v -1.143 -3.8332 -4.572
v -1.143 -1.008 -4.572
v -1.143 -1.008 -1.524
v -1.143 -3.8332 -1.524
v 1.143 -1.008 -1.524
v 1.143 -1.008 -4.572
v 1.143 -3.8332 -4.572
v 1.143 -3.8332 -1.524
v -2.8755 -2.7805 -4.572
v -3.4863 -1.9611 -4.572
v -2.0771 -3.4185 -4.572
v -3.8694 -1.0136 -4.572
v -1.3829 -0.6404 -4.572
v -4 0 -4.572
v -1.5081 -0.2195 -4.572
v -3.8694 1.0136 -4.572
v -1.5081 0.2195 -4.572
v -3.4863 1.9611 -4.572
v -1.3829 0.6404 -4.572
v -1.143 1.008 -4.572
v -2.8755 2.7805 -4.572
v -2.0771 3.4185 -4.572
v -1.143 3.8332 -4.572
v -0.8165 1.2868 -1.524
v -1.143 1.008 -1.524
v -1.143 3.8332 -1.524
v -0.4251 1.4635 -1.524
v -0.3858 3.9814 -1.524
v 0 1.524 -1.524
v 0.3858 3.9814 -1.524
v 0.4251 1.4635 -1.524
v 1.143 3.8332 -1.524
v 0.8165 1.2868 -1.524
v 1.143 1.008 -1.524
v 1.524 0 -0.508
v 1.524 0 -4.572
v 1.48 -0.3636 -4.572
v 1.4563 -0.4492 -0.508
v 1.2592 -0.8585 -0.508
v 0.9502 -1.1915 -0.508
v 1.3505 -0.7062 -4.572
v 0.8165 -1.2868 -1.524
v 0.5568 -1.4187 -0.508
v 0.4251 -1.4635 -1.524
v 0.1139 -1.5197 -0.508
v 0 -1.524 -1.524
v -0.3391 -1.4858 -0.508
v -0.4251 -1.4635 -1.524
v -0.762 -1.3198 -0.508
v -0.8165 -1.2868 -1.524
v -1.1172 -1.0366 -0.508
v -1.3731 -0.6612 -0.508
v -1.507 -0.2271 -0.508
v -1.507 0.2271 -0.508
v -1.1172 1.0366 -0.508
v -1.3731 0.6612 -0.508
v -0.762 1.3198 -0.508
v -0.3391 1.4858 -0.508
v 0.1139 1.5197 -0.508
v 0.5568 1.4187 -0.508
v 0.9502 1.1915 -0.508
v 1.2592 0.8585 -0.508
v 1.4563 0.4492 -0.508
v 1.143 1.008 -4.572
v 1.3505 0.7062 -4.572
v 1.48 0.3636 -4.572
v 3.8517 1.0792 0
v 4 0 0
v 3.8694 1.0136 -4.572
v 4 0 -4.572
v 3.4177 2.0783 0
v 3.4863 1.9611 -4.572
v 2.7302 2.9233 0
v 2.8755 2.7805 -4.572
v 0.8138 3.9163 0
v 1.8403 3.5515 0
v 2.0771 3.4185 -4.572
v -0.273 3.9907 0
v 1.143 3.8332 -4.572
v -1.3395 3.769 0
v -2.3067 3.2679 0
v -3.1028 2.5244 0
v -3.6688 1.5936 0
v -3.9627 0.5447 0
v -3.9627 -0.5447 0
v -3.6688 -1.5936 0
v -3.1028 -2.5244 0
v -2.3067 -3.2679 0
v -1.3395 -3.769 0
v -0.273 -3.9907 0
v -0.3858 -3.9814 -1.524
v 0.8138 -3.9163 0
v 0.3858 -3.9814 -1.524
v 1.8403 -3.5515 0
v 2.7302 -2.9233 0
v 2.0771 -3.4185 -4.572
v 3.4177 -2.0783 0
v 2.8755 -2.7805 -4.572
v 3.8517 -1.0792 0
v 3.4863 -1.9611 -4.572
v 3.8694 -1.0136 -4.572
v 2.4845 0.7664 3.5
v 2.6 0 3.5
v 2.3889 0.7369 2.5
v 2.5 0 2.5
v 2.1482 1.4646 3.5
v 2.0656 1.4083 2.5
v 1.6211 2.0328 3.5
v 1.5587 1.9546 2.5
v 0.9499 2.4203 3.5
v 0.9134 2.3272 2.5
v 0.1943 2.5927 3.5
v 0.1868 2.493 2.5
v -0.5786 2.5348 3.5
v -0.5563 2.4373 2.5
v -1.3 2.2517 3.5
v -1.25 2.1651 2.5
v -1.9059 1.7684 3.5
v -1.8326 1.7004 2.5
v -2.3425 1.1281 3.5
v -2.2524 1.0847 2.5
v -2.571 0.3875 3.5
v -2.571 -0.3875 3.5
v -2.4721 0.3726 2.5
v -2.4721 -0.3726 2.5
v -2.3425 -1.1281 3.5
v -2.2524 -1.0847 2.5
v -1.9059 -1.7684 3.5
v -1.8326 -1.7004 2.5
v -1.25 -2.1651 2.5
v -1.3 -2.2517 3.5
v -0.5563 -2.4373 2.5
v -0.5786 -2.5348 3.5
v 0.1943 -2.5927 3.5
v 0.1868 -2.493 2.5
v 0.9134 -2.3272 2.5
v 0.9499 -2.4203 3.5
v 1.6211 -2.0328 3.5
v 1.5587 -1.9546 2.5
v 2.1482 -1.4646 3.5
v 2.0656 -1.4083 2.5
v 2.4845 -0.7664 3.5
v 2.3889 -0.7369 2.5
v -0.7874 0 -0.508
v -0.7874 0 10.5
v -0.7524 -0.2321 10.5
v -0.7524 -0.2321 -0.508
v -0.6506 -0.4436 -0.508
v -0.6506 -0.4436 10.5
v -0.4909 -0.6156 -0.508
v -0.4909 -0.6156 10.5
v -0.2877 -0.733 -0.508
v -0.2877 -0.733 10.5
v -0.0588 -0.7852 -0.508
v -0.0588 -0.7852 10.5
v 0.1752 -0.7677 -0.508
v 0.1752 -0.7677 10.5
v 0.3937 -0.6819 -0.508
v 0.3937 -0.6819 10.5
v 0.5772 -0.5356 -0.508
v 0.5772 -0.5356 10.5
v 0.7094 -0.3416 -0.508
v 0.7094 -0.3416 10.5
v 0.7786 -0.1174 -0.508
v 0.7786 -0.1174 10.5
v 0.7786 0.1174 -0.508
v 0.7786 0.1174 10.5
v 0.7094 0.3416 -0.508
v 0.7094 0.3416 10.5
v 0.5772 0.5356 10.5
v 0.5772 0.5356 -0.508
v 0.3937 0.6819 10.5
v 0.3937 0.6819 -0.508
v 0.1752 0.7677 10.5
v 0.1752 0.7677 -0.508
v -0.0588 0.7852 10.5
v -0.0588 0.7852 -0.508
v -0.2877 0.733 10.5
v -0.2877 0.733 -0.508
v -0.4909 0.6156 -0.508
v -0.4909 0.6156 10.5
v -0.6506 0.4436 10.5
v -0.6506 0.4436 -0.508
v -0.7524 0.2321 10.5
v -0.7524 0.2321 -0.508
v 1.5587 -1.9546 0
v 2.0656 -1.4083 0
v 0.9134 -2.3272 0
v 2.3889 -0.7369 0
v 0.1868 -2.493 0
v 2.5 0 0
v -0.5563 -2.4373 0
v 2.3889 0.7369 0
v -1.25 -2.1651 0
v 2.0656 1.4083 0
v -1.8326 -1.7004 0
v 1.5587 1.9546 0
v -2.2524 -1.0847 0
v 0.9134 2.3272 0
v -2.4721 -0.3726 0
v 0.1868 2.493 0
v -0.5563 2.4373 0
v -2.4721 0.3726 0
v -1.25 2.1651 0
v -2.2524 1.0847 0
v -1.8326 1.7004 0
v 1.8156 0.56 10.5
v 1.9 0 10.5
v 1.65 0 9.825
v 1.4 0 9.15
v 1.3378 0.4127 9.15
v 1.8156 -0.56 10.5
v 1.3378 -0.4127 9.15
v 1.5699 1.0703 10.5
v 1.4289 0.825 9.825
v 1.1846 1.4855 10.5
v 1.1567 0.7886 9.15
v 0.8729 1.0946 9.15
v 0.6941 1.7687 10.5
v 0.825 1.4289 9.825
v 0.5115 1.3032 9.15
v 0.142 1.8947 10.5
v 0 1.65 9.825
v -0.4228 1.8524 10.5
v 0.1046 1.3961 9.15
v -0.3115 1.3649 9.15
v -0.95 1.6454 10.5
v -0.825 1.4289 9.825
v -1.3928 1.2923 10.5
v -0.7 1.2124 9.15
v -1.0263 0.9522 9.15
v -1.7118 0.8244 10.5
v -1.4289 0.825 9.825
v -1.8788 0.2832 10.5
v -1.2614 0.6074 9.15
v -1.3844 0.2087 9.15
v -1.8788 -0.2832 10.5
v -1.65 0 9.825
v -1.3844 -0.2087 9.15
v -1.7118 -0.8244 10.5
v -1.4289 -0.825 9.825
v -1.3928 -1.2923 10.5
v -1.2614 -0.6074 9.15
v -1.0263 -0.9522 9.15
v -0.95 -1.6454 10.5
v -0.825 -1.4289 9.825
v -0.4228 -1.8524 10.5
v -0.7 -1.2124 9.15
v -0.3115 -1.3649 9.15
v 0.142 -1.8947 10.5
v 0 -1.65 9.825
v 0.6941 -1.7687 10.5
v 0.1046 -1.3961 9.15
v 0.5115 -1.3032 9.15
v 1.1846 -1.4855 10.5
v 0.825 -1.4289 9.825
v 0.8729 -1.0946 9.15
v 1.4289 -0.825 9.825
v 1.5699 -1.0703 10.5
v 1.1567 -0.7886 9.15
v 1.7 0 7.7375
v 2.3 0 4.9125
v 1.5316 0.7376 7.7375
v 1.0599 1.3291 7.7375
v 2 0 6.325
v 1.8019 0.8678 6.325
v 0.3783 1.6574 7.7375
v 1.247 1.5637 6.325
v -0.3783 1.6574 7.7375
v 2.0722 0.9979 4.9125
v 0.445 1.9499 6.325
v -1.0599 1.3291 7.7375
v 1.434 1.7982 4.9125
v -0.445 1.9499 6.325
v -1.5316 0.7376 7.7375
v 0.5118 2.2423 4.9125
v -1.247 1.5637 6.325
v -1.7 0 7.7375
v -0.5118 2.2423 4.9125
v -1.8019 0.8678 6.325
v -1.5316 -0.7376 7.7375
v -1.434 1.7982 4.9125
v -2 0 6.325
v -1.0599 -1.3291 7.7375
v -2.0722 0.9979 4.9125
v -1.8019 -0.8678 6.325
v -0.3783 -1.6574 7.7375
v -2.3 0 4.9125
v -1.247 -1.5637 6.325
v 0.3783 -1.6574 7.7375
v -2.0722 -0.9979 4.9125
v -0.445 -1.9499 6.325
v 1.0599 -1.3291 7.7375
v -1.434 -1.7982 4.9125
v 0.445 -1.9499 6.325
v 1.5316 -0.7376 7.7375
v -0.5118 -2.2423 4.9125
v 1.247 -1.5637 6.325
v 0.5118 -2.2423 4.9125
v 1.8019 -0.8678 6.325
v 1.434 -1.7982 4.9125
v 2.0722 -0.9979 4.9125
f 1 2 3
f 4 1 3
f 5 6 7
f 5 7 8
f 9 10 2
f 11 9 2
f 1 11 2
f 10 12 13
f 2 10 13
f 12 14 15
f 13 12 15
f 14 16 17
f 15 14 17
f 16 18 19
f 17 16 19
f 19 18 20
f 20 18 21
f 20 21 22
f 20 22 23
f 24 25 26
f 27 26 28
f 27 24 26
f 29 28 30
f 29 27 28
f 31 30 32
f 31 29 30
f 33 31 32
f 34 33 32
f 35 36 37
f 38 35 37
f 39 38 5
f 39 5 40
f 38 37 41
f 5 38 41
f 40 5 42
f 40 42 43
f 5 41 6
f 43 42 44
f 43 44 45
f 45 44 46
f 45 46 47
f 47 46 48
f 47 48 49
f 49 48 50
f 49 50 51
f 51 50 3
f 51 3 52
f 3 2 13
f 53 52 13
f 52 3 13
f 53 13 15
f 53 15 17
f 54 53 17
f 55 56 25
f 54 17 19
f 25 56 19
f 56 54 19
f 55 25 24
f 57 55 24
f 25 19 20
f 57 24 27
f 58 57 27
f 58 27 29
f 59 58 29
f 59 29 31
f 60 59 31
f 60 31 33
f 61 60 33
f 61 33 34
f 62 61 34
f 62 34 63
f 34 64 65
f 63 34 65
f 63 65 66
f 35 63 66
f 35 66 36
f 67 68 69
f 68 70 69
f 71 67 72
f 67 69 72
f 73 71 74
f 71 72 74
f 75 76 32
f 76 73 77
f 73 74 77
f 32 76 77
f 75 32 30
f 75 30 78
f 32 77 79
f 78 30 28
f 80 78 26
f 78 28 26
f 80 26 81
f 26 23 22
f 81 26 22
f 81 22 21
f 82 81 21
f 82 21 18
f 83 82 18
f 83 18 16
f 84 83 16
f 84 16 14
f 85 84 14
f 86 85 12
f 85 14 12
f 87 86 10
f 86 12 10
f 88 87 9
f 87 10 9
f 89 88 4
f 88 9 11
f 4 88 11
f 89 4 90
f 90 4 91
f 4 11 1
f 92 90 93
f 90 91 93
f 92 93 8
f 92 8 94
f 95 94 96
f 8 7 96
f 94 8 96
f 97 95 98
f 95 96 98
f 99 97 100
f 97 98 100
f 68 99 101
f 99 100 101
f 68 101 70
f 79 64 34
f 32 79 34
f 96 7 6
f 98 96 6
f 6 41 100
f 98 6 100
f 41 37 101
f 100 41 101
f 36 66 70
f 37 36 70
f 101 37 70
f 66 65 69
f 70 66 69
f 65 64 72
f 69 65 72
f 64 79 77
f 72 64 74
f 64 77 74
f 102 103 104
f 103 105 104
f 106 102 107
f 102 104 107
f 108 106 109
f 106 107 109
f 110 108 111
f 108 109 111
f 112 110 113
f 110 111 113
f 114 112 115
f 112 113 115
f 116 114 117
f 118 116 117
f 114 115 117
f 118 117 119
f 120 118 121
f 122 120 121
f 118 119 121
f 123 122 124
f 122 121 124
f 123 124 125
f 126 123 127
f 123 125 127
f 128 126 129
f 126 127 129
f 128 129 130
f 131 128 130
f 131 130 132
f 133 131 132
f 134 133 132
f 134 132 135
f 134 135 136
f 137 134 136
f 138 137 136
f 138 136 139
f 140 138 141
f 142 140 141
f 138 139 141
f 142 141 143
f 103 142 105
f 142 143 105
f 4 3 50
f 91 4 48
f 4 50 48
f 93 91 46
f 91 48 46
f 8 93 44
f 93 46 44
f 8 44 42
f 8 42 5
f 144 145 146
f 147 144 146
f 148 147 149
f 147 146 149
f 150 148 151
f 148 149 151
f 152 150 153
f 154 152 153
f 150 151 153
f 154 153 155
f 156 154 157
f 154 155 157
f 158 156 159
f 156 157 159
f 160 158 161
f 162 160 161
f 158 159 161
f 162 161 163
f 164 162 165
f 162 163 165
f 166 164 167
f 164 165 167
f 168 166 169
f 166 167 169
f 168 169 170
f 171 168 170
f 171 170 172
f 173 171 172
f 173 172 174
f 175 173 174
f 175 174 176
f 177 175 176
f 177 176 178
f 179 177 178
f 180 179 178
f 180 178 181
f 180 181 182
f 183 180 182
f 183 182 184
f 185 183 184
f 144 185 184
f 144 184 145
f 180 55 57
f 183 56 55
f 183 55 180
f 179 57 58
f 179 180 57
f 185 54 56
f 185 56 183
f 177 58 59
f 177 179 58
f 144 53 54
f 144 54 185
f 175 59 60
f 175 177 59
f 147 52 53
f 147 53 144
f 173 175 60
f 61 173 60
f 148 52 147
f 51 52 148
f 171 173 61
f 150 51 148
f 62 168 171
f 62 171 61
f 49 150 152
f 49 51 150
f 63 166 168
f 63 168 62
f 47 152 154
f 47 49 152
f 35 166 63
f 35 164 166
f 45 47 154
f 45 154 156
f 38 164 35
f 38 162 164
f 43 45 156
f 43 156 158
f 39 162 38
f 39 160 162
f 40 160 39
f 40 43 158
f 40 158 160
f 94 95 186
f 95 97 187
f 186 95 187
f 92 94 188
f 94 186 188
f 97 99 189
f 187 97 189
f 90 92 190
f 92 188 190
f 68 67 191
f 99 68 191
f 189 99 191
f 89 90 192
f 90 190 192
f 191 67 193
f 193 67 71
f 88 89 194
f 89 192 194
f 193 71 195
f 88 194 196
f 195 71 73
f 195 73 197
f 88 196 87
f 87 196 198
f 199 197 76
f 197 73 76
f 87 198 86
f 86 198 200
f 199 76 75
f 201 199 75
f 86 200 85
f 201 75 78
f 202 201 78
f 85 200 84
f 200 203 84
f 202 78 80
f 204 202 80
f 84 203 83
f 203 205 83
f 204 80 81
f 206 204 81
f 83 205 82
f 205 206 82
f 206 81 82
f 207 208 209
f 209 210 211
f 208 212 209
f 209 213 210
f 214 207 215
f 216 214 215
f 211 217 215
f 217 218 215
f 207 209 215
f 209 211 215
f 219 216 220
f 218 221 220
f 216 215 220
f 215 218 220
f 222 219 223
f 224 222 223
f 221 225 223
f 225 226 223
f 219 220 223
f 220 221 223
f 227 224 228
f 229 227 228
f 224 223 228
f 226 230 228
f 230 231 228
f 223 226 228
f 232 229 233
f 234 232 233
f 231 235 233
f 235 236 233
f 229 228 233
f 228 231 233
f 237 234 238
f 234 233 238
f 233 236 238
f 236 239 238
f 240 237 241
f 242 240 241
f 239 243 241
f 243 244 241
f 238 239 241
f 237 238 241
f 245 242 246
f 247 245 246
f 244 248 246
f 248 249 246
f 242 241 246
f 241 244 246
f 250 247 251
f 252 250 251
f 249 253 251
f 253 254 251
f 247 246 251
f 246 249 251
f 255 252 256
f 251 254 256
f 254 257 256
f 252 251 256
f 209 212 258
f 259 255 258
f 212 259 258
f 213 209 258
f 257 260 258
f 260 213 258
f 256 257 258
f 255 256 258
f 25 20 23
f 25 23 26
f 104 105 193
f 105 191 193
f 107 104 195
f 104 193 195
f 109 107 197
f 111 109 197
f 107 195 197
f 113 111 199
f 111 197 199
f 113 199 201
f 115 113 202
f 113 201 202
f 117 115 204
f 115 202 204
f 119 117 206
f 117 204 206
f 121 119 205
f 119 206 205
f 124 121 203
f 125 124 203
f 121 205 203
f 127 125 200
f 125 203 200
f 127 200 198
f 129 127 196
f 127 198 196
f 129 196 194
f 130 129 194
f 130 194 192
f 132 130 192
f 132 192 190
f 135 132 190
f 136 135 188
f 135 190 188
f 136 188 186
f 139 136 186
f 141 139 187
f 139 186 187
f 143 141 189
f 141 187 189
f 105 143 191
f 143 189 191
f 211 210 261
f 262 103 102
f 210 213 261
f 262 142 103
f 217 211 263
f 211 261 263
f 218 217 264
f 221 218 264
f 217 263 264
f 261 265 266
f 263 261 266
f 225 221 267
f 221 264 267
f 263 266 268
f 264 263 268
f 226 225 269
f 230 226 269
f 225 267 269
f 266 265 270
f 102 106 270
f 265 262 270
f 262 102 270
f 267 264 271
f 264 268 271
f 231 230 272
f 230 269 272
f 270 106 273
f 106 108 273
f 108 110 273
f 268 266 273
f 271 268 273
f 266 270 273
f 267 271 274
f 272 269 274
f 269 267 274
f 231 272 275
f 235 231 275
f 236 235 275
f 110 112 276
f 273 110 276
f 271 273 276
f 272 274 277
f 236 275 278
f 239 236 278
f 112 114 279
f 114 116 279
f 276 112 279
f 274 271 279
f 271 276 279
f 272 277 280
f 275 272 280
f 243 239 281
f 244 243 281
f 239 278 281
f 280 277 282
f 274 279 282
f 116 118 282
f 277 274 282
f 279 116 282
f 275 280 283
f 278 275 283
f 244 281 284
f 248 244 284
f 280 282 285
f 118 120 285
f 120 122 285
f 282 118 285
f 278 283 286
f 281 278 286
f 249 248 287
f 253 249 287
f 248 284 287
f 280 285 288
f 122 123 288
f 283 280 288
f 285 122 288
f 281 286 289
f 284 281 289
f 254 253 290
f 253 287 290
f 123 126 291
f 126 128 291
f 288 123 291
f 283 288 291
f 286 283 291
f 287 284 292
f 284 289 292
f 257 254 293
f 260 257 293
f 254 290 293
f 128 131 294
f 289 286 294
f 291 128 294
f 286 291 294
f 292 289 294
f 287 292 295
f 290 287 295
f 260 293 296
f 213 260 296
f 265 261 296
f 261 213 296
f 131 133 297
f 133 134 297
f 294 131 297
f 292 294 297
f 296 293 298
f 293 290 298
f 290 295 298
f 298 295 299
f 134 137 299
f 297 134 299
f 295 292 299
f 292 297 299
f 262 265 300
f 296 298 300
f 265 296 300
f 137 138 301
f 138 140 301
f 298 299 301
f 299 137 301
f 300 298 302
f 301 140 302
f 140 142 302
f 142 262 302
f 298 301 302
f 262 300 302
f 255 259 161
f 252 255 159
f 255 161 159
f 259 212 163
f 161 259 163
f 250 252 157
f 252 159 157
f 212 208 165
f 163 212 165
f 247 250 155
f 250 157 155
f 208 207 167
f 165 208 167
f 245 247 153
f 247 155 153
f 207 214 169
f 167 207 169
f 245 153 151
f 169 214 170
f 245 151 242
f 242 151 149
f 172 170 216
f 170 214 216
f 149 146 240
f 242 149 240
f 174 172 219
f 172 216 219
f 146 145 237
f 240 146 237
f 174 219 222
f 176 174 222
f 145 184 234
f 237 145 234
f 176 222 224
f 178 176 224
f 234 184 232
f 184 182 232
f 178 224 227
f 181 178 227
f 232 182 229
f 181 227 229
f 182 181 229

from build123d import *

# Parameters (mm, degrees)
SKETCH001_R          = 1.524
POCKET_DEPTH         = 4.064
SKETCH002_R          = 0.7874
POCKET001_DEPTH      = 15.073
SKETCH003_W          = 2.286
SKETCH003_H          = 5.08
POCKET002_DEPTH      = 5.0038
POCKET002_DEPTH_BACK = -99.9998


with BuildPart() as part:
    # Sketch → Revolution (revolve)
    with BuildSketch(Plane.XZ):
        Polygon((2.5, 0), (4, 0), (4, -4.572), (0, -4.572), (0, 0), (0, 10.5), (1.9, 10.5), (1.4, 9.15), (2.6, 3.5), (2.5, 2.5), align=None)
    revolve(axis=Axis((0, 0, 0), (0, 0, 1)))

    # Sketch001 (on Face5 of Revolution) → Pocket (cut)
    with BuildSketch(Plane(origin=(0, 0, -4.572), x_dir=(1, 0, 0), z_dir=(0, 0, -1))):
        Circle(SKETCH001_R)
    extrude(amount=-POCKET_DEPTH, mode=Mode.SUBTRACT)

    # Sketch002 (on Face6 of Pocket) → Pocket001 (cut, through all)
    with BuildSketch(Plane(origin=(0, 0, 10.5), x_dir=(-1, 0, 0), z_dir=(0, 0, 1))):
        Circle(SKETCH002_R)
    extrude(amount=-POCKET001_DEPTH, mode=Mode.SUBTRACT)

    # Sketch003 → Pocket002 (cut, two sides)
    with BuildSketch(Plane.XZ) as pocket002_sk:
        with Locations((0, -4.064)):
            Rectangle(SKETCH003_W, SKETCH003_H)
    extrude(amount=-POCKET002_DEPTH, mode=Mode.SUBTRACT)
    extrude(pocket002_sk.sketch, amount=-POCKET002_DEPTH_BACK, mode=Mode.SUBTRACT)


solid = part.part
